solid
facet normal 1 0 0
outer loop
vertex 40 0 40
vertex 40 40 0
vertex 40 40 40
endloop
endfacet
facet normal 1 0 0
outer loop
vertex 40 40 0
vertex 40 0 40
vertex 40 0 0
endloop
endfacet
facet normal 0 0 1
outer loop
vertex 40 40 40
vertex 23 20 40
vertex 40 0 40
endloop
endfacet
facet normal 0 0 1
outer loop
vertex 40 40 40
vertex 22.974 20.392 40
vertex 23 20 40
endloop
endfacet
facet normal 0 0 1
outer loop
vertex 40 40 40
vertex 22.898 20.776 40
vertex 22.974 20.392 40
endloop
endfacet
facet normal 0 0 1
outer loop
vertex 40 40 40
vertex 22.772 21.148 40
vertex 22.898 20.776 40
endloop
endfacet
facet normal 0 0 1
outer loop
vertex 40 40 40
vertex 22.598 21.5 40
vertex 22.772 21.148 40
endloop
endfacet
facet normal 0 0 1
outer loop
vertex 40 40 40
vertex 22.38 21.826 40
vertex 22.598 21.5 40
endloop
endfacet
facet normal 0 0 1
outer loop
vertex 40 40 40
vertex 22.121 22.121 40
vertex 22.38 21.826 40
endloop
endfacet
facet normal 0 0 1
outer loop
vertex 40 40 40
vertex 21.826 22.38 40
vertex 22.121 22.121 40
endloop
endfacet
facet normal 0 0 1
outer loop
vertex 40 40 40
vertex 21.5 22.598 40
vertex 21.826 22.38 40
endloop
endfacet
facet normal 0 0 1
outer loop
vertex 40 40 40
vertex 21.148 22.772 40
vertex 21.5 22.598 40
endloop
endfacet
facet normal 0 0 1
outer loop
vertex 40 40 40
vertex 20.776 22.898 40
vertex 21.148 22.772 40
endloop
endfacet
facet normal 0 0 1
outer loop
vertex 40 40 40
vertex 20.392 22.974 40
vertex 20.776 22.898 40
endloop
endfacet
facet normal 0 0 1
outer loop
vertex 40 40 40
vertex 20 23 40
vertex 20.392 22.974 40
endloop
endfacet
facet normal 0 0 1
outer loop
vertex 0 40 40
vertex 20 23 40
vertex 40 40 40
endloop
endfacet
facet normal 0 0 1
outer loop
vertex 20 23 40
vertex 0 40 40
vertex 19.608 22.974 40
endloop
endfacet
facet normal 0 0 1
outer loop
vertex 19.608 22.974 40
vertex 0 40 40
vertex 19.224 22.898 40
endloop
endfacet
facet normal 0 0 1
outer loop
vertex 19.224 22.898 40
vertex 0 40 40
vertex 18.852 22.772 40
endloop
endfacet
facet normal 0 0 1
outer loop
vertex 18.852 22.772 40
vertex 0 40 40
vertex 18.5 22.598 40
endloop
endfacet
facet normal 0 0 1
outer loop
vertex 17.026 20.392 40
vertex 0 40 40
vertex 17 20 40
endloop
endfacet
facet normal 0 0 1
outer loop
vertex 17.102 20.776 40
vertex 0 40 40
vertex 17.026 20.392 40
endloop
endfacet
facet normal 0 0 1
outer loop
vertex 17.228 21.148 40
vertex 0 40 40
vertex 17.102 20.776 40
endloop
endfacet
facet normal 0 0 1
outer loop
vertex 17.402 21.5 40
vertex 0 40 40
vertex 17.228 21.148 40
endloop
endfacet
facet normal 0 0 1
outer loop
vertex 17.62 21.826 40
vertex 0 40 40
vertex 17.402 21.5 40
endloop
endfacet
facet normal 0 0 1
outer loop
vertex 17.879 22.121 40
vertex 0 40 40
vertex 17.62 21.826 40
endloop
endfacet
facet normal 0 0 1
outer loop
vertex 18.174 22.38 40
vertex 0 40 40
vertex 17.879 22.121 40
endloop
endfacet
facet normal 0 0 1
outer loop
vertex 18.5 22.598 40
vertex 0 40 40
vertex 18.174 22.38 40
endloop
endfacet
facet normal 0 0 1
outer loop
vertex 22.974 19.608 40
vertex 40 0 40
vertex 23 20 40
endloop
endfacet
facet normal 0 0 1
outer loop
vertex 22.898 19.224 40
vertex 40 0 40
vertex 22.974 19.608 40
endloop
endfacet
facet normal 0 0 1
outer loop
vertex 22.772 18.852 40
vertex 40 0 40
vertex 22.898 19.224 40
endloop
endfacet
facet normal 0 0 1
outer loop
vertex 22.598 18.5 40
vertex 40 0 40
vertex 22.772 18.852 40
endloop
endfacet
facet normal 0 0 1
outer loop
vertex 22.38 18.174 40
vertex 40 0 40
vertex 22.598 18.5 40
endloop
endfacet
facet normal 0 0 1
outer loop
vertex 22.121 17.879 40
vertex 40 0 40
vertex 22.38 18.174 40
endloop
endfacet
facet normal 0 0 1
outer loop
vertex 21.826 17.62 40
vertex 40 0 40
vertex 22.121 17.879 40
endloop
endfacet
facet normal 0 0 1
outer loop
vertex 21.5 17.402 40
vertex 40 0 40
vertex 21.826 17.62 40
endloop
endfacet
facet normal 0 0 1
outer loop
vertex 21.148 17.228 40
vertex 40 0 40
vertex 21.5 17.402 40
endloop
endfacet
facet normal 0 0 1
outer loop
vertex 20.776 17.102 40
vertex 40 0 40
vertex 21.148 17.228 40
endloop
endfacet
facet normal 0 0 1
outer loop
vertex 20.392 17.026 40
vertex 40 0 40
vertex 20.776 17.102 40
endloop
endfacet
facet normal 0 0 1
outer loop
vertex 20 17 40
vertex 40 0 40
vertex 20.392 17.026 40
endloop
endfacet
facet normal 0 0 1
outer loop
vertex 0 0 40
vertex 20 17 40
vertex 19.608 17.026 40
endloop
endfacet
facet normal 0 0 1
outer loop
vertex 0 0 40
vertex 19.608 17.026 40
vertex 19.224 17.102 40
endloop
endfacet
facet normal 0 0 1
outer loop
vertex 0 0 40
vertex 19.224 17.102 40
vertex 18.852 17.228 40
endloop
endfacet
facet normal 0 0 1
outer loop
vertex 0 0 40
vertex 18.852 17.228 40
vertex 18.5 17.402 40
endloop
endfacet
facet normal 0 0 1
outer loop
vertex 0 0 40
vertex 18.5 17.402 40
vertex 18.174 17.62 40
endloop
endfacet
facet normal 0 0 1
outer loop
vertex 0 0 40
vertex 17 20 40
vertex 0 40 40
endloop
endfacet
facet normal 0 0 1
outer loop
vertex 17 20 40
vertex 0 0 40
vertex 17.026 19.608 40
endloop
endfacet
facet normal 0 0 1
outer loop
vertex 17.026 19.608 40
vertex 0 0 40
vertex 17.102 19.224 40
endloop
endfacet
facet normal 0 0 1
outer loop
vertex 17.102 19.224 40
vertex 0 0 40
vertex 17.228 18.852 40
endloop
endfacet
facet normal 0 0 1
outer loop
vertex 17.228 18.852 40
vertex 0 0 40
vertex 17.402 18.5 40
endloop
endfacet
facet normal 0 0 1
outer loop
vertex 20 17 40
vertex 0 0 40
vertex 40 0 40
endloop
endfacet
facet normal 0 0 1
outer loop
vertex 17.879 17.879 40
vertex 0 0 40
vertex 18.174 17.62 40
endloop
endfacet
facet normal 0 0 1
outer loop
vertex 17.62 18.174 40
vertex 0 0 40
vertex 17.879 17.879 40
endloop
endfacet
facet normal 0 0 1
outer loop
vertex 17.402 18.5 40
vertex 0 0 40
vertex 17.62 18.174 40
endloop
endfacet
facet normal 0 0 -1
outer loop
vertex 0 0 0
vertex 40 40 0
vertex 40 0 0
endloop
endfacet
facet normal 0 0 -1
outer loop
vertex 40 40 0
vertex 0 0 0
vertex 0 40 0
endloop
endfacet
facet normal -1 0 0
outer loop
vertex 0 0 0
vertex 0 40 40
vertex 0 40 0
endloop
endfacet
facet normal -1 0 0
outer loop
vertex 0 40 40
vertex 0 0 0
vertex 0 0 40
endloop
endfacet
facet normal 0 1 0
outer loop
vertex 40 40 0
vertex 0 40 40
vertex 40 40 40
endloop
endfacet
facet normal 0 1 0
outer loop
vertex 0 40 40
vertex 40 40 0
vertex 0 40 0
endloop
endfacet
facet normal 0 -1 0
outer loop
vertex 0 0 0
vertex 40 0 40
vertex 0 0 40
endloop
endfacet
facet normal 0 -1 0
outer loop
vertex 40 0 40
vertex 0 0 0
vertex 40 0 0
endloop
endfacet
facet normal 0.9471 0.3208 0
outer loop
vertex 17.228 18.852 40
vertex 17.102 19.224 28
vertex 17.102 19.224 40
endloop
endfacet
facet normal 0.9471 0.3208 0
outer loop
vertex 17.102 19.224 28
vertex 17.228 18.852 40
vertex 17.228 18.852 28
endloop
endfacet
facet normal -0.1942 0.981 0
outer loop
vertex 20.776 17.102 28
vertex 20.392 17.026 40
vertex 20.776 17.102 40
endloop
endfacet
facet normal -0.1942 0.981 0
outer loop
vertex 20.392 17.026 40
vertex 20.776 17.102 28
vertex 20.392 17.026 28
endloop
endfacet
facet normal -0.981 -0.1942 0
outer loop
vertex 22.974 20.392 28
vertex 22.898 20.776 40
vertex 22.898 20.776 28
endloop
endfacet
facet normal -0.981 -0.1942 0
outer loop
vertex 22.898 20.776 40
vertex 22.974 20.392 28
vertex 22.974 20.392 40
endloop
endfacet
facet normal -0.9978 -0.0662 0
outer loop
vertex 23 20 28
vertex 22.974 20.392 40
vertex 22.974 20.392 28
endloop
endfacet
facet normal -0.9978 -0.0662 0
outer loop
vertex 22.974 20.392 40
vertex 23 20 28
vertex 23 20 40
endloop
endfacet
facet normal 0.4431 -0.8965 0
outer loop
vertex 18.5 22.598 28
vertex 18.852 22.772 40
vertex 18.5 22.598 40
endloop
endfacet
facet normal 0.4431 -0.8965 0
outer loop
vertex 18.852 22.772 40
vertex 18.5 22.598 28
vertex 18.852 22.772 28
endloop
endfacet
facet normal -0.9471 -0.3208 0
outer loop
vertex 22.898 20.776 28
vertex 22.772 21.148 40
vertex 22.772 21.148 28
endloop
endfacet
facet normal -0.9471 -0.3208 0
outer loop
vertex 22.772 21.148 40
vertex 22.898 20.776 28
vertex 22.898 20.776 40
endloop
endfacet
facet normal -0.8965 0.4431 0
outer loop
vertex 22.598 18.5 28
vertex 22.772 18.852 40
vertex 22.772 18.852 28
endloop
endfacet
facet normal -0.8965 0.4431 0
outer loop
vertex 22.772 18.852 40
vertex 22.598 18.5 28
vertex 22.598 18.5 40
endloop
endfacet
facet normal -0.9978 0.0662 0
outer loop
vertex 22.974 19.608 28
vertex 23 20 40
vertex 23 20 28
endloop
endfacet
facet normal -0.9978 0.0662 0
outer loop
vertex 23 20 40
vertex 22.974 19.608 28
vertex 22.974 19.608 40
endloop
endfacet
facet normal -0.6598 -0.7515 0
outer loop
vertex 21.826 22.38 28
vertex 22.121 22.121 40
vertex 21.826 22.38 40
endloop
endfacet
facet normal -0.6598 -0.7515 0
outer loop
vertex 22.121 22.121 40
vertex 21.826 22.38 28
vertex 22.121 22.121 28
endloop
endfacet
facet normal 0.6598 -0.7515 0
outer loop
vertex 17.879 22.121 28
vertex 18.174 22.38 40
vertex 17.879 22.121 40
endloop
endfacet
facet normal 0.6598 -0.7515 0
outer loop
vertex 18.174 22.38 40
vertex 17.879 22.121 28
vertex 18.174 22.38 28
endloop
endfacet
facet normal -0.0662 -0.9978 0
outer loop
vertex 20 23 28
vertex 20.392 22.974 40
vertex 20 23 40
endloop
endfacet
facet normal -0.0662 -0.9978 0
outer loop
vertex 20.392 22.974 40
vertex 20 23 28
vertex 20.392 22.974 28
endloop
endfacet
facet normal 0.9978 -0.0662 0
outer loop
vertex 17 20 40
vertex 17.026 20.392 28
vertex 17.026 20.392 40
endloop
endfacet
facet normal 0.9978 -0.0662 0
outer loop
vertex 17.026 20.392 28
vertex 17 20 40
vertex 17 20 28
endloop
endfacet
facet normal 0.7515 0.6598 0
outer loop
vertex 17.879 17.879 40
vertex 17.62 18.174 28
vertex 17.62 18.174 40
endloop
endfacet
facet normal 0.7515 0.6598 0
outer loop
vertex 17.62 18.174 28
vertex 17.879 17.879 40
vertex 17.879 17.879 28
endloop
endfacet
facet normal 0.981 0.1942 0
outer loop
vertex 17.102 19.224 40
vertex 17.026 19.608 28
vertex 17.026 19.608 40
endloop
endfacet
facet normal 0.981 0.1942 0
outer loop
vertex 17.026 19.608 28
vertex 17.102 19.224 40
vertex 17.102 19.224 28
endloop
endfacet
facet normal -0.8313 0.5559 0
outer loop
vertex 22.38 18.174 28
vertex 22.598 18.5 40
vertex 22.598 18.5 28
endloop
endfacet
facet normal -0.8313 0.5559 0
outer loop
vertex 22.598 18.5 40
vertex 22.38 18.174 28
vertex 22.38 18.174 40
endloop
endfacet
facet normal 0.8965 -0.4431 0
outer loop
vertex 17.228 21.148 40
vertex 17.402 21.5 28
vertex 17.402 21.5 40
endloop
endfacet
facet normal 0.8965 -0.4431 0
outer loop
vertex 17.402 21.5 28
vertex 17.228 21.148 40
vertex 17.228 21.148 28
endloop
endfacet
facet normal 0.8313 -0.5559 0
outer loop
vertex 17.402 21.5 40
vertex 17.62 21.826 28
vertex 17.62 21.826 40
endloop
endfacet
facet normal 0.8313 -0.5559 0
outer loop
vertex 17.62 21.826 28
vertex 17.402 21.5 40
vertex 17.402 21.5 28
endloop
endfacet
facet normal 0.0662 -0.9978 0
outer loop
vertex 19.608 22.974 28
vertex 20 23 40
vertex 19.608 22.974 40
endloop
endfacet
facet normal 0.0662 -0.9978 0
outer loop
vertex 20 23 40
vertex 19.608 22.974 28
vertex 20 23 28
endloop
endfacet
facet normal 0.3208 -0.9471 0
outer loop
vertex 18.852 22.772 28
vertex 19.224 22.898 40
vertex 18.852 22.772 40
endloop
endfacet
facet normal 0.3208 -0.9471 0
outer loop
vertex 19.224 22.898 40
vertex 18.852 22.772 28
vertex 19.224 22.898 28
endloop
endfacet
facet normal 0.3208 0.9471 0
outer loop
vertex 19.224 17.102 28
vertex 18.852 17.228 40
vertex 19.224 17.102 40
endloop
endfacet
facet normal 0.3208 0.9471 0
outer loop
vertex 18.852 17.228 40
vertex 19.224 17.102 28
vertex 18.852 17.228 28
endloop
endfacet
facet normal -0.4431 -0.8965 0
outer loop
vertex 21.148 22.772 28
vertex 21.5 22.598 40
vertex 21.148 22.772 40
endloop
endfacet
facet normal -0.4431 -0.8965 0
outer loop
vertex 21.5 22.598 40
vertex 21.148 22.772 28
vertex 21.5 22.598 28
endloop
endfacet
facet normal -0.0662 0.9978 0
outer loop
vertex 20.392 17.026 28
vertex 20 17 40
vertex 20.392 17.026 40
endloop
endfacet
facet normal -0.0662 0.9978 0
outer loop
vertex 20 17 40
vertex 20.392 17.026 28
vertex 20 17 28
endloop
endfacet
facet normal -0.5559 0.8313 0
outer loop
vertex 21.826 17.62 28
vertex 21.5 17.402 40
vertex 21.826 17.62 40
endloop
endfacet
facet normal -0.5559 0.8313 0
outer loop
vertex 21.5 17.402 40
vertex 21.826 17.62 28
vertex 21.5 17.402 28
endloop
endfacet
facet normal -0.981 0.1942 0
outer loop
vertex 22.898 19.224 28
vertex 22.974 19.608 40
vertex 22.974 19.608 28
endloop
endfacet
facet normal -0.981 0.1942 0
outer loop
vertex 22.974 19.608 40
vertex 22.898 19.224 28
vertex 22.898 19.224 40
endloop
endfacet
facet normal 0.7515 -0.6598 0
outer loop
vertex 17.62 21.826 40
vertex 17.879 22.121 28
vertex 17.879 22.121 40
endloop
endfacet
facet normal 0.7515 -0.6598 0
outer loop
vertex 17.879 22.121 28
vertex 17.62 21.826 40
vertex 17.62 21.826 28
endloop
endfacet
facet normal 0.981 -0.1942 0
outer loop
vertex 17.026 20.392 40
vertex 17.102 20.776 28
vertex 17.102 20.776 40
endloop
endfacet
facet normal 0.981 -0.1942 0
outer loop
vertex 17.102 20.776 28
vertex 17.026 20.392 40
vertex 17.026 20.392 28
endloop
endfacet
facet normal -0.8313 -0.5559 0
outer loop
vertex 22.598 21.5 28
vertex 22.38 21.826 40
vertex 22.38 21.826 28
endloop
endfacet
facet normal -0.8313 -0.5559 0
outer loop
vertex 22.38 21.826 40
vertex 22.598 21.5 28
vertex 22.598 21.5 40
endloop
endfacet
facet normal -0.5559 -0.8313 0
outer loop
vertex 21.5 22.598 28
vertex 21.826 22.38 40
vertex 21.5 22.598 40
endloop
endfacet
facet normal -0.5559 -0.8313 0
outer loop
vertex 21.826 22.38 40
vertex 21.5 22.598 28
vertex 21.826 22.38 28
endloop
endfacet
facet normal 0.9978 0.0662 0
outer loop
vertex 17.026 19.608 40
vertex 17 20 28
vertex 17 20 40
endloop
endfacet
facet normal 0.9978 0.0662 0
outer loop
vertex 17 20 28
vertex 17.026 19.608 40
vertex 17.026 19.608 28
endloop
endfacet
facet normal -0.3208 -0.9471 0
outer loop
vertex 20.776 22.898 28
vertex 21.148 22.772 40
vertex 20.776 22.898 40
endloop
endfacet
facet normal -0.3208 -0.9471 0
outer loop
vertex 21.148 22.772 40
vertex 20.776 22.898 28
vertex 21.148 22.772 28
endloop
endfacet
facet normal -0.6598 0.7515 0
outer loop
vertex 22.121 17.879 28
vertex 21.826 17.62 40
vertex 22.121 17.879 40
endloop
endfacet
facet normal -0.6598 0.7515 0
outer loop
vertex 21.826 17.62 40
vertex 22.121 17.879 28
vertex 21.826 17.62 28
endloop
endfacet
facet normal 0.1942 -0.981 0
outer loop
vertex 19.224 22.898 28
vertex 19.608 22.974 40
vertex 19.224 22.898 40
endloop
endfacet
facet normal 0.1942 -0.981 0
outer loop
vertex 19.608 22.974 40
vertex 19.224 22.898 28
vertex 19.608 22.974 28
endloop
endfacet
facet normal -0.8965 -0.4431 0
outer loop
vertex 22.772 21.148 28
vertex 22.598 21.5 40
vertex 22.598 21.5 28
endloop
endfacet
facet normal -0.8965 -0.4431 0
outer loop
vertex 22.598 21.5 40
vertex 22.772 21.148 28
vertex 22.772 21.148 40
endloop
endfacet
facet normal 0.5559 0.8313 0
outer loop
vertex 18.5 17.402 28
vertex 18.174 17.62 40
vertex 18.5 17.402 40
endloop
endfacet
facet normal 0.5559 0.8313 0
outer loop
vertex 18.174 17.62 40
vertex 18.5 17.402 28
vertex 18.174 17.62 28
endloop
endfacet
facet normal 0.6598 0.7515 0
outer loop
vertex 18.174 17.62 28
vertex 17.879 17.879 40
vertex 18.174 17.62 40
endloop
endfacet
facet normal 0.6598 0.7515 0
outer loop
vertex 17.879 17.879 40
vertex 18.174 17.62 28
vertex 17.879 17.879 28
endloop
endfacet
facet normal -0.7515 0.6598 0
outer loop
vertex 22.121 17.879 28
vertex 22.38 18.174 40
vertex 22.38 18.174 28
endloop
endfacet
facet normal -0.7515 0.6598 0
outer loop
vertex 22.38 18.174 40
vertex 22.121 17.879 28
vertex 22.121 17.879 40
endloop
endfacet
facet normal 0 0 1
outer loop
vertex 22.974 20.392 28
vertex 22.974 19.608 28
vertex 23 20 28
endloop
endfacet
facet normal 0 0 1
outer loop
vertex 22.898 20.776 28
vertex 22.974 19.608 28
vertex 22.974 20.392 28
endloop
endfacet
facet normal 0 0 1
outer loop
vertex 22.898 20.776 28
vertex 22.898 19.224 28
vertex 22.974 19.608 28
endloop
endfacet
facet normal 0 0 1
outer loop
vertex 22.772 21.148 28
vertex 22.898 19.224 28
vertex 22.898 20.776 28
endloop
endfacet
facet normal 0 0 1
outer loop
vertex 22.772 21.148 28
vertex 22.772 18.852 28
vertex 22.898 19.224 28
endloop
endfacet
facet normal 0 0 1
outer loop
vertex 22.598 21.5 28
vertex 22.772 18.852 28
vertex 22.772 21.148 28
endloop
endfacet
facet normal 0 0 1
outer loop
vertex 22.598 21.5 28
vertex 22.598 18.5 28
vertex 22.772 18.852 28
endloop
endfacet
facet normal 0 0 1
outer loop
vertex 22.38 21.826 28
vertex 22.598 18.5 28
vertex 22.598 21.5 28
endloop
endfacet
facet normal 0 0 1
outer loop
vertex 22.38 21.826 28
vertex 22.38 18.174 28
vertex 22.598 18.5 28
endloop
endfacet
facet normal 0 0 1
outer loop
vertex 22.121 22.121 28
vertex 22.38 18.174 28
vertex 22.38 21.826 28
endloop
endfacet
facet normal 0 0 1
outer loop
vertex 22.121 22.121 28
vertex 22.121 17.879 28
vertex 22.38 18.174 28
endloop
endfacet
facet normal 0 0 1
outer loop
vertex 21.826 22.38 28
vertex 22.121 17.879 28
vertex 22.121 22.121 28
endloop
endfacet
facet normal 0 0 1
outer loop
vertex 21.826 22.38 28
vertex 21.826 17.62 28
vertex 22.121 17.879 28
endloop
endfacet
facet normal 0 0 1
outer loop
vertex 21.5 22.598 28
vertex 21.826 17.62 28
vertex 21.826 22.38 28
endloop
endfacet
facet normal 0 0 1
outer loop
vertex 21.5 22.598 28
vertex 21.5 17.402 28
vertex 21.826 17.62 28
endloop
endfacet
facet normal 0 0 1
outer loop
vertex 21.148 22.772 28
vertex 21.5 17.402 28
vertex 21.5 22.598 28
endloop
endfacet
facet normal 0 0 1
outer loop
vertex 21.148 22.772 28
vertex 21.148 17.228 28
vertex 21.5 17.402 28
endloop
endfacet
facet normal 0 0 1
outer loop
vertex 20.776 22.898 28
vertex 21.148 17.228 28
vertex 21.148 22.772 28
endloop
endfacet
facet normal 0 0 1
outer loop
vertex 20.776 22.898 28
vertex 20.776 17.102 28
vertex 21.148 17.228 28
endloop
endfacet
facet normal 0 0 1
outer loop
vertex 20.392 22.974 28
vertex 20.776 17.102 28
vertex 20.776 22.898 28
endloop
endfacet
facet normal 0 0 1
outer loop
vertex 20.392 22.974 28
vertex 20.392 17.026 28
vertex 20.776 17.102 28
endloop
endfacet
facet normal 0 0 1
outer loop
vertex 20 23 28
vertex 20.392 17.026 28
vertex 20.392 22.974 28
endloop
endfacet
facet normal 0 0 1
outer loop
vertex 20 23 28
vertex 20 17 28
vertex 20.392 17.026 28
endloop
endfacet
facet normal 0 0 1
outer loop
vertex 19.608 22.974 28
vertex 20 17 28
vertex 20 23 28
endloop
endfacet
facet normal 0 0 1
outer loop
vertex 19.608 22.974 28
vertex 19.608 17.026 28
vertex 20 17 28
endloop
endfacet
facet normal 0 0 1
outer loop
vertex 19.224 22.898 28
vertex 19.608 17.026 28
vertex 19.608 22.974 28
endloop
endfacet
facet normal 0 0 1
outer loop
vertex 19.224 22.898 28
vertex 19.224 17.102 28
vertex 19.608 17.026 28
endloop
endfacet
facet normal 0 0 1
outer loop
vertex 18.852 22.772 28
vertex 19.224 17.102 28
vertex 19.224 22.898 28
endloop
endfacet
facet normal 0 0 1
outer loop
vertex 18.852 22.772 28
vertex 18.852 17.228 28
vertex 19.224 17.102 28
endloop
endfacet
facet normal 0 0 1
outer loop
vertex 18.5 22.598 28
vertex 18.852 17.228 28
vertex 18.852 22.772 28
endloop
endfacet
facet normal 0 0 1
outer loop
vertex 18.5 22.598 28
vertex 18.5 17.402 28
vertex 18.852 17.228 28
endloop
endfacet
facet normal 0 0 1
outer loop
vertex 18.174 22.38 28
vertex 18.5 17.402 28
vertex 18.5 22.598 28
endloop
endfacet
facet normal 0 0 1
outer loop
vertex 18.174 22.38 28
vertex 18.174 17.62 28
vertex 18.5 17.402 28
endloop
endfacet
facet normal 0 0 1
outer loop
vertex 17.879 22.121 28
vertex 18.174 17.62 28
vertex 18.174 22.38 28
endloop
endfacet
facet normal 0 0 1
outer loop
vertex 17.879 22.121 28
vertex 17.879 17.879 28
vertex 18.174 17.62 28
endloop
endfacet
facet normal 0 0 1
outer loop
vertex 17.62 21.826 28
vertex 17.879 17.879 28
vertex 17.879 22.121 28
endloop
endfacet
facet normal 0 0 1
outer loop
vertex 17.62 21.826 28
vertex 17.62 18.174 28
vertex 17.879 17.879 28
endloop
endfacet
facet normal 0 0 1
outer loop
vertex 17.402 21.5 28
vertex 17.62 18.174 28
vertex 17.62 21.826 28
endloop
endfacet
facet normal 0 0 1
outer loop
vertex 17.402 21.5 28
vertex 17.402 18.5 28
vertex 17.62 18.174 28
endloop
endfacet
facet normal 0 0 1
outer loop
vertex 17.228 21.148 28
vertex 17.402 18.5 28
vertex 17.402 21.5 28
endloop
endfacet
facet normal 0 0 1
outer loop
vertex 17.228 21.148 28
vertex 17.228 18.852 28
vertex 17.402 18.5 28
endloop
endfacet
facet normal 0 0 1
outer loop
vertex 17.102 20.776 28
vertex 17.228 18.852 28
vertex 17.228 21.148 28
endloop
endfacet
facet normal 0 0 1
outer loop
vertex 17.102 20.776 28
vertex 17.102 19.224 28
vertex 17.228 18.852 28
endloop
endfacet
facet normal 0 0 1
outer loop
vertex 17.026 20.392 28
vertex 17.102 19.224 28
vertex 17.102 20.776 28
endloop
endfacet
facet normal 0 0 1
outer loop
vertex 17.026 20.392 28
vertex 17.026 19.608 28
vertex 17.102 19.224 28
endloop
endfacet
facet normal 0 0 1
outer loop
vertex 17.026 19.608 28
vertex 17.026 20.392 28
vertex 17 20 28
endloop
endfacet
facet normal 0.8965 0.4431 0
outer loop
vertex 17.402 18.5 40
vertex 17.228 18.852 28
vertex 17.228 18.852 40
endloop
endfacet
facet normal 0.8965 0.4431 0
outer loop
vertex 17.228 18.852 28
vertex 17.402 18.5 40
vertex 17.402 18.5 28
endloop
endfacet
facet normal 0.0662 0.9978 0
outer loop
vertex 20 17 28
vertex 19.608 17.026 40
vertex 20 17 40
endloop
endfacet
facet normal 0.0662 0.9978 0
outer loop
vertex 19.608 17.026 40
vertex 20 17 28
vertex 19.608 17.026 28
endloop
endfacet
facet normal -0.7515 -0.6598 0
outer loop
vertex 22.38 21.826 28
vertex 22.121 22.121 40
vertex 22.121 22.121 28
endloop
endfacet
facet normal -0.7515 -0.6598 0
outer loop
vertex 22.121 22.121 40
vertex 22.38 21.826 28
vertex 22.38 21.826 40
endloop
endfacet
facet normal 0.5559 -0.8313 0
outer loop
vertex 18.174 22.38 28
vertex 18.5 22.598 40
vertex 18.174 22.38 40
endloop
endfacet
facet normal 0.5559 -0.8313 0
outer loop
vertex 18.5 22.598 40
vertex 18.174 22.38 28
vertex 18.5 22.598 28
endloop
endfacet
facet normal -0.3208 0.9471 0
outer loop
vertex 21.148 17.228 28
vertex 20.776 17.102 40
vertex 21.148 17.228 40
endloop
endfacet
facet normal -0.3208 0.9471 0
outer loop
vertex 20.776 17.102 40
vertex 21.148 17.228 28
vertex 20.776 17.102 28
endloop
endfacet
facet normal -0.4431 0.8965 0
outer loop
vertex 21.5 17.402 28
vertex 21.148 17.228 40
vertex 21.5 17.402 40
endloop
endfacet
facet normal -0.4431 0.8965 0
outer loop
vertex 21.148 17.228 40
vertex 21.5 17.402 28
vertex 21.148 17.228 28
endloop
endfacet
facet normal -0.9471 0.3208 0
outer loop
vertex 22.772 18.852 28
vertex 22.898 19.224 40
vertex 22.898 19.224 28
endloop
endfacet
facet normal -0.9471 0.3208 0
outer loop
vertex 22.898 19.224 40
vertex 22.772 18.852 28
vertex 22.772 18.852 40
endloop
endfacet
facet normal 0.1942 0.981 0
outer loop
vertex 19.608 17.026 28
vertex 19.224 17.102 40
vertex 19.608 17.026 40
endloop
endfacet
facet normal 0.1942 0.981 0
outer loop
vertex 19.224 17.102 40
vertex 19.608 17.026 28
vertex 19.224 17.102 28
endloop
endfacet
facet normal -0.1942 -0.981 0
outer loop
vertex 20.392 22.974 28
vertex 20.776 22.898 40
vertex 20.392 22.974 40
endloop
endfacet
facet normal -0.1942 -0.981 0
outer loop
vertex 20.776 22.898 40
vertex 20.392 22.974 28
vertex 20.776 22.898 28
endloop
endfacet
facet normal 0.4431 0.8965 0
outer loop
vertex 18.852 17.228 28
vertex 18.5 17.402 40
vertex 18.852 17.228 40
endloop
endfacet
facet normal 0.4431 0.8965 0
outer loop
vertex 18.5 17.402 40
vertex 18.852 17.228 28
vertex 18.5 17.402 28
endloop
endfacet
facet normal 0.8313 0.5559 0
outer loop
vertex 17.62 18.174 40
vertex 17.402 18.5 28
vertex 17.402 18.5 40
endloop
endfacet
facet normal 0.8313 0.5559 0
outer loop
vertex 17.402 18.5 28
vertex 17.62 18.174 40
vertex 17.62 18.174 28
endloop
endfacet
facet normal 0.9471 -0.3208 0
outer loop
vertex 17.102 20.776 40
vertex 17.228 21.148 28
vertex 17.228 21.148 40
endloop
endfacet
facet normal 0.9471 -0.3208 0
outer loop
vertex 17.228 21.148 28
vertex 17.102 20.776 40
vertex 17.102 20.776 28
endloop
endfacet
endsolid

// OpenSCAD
$fn=48;
difference(){ cube([40,40,40]); translate([20,20,28]) cylinder(h=20,d=6); }
